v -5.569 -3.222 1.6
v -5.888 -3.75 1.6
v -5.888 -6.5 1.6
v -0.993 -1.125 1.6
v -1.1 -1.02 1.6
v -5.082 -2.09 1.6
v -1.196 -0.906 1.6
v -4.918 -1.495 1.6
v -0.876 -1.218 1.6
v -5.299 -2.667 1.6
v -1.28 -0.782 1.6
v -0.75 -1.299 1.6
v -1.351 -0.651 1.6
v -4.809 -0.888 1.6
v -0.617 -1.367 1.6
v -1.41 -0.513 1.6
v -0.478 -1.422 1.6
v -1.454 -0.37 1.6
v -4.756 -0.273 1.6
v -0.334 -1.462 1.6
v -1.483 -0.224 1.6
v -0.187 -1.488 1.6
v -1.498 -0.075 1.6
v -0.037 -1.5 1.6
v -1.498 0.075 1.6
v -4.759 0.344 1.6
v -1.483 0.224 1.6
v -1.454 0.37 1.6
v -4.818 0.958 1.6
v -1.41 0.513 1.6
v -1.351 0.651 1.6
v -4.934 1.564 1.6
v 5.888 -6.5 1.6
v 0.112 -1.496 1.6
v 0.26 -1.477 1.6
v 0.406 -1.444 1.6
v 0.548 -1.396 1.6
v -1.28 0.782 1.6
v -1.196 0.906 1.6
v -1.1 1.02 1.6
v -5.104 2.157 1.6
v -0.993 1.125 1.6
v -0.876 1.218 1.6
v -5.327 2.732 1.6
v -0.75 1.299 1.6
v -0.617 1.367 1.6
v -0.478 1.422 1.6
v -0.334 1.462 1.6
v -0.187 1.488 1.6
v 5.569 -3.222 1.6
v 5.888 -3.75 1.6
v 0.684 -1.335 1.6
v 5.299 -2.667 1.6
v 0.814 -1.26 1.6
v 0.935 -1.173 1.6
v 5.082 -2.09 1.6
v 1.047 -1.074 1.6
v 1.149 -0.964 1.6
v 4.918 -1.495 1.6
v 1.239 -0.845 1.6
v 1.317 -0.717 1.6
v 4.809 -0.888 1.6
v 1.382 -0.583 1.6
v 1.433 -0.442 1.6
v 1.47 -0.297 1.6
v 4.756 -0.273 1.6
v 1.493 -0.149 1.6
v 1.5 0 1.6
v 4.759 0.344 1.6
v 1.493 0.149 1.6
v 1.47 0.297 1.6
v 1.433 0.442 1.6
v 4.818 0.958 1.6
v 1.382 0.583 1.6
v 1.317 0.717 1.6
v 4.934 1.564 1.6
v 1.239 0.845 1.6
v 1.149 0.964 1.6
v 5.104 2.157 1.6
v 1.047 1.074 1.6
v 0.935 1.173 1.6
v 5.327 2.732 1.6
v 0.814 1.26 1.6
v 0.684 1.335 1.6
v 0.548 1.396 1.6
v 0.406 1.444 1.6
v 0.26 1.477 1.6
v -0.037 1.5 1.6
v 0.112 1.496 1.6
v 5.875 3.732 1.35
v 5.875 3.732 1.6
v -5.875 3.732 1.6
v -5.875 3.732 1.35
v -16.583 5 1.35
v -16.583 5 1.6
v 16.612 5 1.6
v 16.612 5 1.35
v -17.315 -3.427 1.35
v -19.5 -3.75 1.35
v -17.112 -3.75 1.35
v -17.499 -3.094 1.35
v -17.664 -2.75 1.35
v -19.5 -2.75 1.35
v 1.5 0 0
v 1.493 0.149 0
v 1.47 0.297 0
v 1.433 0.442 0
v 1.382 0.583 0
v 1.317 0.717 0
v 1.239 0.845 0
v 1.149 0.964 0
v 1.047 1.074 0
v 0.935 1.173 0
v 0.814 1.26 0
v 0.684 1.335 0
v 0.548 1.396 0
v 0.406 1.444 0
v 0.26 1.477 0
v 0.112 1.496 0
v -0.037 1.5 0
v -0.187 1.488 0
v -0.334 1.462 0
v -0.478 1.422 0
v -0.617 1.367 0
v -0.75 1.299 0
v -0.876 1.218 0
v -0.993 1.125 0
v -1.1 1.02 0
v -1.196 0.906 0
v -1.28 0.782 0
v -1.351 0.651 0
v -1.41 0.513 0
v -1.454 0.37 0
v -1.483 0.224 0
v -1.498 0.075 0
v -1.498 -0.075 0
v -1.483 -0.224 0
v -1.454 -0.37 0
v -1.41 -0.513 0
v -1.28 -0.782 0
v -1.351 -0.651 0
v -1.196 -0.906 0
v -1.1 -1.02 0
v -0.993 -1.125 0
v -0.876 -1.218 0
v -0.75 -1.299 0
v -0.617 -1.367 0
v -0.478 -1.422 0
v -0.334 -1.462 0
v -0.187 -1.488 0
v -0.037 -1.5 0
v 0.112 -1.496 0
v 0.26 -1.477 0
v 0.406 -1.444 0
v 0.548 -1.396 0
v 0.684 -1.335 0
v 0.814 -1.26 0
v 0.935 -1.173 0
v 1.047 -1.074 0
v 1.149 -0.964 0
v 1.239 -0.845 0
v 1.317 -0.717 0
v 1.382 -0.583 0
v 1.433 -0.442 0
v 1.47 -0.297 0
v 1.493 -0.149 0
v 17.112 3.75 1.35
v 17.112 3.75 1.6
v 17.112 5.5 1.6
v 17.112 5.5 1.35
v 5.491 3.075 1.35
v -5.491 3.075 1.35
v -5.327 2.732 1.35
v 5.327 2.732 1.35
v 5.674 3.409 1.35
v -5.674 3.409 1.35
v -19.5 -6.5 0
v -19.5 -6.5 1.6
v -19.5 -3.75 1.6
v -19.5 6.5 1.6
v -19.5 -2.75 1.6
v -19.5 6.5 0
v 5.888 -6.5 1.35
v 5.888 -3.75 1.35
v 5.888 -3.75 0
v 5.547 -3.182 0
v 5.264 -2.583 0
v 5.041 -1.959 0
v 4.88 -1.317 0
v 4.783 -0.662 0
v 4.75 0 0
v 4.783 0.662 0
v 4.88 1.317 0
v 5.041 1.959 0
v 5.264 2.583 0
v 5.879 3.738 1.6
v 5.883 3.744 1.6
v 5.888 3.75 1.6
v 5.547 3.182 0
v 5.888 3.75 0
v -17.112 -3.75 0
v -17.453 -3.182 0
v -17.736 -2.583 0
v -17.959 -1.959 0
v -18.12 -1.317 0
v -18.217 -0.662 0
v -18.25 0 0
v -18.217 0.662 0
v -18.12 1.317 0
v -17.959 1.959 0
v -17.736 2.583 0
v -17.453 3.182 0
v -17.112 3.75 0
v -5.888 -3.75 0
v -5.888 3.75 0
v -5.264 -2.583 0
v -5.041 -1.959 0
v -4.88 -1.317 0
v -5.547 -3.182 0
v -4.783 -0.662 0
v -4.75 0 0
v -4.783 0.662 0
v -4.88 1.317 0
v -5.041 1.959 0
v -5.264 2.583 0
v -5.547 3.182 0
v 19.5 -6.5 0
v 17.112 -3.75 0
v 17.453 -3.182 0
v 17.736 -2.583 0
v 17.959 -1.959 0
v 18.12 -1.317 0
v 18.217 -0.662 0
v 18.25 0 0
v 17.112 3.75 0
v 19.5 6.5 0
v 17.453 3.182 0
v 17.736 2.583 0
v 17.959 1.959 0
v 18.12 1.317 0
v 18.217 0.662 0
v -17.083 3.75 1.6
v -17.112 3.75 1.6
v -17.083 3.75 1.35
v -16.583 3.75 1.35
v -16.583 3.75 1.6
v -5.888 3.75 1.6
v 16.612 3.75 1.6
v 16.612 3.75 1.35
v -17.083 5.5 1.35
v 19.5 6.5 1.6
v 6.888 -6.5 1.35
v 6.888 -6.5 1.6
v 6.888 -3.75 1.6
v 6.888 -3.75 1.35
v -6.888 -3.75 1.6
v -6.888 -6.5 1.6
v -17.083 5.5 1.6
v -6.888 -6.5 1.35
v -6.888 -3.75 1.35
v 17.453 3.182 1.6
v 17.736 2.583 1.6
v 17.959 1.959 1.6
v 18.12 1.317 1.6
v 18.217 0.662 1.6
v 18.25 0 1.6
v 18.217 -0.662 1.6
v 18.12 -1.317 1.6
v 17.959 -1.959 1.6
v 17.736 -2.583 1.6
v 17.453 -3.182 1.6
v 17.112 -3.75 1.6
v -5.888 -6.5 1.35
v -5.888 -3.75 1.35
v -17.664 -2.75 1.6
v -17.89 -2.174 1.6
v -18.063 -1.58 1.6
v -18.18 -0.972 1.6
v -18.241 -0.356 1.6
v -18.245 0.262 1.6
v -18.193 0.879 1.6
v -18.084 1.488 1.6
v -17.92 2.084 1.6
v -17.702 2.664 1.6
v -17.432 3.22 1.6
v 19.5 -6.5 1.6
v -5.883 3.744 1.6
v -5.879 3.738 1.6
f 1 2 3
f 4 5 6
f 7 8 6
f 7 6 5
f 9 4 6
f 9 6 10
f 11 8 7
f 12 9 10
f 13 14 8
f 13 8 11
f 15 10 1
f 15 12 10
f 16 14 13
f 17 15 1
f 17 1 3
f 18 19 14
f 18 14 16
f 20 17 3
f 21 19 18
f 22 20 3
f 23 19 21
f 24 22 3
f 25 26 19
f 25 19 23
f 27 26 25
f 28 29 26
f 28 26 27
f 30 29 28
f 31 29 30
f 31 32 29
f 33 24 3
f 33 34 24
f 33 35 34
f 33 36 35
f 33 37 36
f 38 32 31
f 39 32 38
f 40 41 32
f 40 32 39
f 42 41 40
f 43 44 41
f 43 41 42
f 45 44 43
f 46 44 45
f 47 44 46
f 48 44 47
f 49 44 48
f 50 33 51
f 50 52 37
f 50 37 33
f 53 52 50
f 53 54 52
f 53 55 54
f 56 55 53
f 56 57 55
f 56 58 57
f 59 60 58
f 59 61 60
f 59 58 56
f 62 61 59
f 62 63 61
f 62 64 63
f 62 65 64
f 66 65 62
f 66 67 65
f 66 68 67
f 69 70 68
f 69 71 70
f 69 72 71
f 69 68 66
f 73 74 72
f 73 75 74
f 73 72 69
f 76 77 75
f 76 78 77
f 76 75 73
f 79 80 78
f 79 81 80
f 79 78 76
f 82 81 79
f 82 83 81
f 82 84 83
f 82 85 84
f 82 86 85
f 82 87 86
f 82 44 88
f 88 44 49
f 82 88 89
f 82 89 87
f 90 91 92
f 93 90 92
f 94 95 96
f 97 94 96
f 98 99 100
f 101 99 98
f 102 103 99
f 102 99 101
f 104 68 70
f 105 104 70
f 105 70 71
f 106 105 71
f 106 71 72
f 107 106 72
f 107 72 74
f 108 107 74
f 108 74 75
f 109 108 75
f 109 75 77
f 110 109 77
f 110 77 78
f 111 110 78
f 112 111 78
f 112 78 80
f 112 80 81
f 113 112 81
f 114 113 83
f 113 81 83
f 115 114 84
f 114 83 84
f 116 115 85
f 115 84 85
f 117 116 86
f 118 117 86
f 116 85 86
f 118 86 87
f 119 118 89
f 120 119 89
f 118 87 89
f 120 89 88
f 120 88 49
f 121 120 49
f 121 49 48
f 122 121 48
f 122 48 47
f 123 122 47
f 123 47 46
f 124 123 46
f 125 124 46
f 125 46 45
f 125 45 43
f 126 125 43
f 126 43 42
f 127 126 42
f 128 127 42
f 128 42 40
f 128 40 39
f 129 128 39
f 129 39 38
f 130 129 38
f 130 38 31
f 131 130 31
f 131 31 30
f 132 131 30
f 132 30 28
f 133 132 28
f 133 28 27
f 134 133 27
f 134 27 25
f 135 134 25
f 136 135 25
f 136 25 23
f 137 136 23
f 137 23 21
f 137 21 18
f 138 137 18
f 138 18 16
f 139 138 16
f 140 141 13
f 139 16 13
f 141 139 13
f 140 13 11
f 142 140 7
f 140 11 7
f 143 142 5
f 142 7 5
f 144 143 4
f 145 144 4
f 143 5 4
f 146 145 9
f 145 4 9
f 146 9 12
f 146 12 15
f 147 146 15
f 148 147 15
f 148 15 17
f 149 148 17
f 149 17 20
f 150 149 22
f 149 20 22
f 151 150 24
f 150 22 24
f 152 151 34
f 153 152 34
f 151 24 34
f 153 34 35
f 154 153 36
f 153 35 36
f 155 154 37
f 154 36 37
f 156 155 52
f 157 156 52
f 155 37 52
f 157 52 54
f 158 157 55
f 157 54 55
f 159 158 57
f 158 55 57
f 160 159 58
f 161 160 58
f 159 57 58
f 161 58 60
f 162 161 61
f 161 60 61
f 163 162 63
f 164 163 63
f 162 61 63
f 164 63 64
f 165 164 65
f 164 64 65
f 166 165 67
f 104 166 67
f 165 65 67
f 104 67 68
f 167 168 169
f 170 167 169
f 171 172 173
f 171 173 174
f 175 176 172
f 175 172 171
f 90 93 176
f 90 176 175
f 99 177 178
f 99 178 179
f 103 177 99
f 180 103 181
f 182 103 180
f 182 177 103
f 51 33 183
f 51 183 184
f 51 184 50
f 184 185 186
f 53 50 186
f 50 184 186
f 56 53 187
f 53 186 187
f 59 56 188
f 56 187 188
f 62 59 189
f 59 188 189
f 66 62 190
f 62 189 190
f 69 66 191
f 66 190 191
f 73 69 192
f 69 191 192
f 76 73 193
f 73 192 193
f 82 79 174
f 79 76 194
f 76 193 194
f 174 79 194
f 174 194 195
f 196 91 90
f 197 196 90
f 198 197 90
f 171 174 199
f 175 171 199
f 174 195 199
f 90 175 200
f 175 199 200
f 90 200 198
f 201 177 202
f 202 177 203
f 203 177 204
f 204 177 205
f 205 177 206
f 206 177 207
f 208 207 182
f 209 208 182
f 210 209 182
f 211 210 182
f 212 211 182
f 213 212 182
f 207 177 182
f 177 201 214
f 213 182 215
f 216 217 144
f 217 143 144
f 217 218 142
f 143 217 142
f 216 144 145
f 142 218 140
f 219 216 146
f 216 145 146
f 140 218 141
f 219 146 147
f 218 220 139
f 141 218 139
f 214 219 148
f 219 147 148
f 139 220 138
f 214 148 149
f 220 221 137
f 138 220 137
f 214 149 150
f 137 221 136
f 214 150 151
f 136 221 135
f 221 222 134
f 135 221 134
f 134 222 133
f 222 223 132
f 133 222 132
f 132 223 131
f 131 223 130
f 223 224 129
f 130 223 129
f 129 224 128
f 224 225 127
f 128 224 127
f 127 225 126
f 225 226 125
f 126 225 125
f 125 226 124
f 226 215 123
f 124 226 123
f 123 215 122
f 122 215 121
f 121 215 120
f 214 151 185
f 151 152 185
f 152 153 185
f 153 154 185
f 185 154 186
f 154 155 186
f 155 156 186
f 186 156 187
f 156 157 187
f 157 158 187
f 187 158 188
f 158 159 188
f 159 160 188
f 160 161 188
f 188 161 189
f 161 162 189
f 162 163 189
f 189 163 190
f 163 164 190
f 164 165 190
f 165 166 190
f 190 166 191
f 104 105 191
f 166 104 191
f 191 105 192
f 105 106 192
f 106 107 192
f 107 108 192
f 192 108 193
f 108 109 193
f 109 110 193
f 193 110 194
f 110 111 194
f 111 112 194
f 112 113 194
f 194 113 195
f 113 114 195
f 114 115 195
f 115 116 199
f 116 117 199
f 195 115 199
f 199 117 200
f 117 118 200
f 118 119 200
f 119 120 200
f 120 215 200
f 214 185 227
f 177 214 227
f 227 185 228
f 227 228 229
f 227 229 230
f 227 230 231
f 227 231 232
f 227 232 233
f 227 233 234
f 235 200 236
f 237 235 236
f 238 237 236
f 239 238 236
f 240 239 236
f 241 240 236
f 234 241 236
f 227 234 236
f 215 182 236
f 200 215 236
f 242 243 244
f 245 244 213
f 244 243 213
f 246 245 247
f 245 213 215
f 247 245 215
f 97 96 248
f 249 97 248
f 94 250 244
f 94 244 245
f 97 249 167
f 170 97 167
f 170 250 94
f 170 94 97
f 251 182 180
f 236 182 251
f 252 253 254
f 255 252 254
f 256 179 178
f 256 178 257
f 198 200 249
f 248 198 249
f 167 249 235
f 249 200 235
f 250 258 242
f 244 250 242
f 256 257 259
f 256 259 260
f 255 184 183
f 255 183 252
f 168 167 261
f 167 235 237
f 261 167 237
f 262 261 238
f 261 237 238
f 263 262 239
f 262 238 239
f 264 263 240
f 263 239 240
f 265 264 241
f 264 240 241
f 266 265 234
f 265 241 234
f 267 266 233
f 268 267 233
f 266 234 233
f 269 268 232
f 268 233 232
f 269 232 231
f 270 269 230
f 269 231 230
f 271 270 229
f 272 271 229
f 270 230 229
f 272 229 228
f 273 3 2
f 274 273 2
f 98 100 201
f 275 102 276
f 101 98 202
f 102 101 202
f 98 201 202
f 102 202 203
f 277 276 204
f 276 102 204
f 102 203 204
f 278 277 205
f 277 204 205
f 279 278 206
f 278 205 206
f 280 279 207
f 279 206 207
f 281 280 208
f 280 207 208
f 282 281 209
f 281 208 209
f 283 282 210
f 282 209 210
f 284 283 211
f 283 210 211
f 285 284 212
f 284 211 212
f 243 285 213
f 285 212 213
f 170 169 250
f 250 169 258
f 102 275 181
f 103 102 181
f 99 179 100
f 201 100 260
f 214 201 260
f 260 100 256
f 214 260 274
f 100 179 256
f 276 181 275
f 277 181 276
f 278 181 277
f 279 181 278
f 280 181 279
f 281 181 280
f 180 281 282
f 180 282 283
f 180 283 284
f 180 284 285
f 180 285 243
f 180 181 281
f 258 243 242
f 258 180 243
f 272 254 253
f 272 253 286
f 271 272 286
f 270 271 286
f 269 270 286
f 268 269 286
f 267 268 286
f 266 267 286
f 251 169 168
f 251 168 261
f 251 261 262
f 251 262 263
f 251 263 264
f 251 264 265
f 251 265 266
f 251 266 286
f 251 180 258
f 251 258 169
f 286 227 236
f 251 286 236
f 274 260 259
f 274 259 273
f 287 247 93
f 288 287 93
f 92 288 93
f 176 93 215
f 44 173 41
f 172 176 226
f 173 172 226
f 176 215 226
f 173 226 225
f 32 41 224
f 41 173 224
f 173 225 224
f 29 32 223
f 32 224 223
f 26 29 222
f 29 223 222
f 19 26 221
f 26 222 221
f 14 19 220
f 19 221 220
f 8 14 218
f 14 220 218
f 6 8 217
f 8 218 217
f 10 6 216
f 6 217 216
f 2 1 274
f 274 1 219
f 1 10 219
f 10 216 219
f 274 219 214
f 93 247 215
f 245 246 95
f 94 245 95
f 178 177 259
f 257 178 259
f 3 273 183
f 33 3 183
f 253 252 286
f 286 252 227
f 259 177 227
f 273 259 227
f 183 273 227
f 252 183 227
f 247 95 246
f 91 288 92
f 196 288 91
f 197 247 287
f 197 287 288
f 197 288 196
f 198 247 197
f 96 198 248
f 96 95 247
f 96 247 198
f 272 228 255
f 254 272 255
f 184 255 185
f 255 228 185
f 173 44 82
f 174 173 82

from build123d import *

# Parameters (mm, degrees)
F0_W     = 39
F0_H     = 13
F1_DEPTH = 1.6
F2_W     = 1
F2_H     = 2.75
F3_DEPTH = 0.25
F4_R     = 1.5
F5_DEPTH = 1.601


with BuildPart() as f1:
    # F0 (on Top) → F1 (new body)
    with BuildSketch(Plane.XY):
        Rectangle(F0_W, F0_H)
        with BuildLine():
            ThreePointArc((-5.8875139198, 3.75), (-4.75, 0), (-5.8875139198, -3.75))
            Line((-5.8875139198, -3.75), (-17.1124860802, -3.75))
            ThreePointArc((-17.1124860802, -3.75), (-18.25, 0), (-17.1124860802, 3.75))
            Line((-17.1124860802, 3.75), (-5.8875139198, 3.75))
        make_face(mode=Mode.SUBTRACT)
        with BuildLine():
            ThreePointArc((5.8875139198, -3.75), (4.75, 0), (5.8875139198, 3.75))
            Line((5.8875139198, 3.75), (17.1124860802, 3.75))
            ThreePointArc((17.1124860802, 3.75), (18.25, 0), (17.1124860802, -3.75))
            Line((17.1124860802, -3.75), (5.8875139198, -3.75))
        make_face(mode=Mode.SUBTRACT)
    extrude(amount=F1_DEPTH)

    # F2 (on face) → F3 (cut)
    with BuildSketch(Plane.XY.offset(1.6)):
        Polygon((-17.0829144429, 5.5), (-17.0829144429, 3.75), (-16.5829144429, 3.75), (-16.5829144429, 5), (16.6124860802, 5), (16.6124860802, 3.75), (17.1124860802, 3.75), (17.1124860802, 5.5), align=None)
        with BuildLine():
            ThreePointArc((-5.8752075463, 3.7315157581), (-5.580137224, 3.2431041787), (-5.3273731959, 2.7315157581))
            Line((-5.3273731959, 2.7315157581), (5.3273731959, 2.7315157581))
            ThreePointArc((5.3273731959, 2.7315157581), (5.580137224, 3.2431041787), (5.8752075463, 3.7315157581))
            Line((5.8752075463, 3.7315157581), (-5.8752075463, 3.7315157581))
        make_face()
        with Locations((-6.3875139198, -5.125)):
            Rectangle(F2_W, F2_H)
        with BuildLine():
            Line((-19.5, -2.75), (-19.5, -3.75))
            Line((-19.5, -3.75), (-17.1124860802, -3.75))
            ThreePointArc((-17.1124860802, -3.75), (-17.4096399122, -3.2616952813), (-17.664414003, -2.75))
            Line((-17.664414003, -2.75), (-19.5, -2.75))
        make_face()
        with Locations((6.3875139198, -5.125)):
            Rectangle(F2_W, F2_H)
    extrude(amount=-F3_DEPTH, mode=Mode.SUBTRACT)

    # F4 (on face) → F5 (cut, through all)
    with BuildSketch(Plane.XY.offset(1.6)):
        Circle(F4_R)
    extrude(amount=-F5_DEPTH, mode=Mode.SUBTRACT)


solid = f1.part
